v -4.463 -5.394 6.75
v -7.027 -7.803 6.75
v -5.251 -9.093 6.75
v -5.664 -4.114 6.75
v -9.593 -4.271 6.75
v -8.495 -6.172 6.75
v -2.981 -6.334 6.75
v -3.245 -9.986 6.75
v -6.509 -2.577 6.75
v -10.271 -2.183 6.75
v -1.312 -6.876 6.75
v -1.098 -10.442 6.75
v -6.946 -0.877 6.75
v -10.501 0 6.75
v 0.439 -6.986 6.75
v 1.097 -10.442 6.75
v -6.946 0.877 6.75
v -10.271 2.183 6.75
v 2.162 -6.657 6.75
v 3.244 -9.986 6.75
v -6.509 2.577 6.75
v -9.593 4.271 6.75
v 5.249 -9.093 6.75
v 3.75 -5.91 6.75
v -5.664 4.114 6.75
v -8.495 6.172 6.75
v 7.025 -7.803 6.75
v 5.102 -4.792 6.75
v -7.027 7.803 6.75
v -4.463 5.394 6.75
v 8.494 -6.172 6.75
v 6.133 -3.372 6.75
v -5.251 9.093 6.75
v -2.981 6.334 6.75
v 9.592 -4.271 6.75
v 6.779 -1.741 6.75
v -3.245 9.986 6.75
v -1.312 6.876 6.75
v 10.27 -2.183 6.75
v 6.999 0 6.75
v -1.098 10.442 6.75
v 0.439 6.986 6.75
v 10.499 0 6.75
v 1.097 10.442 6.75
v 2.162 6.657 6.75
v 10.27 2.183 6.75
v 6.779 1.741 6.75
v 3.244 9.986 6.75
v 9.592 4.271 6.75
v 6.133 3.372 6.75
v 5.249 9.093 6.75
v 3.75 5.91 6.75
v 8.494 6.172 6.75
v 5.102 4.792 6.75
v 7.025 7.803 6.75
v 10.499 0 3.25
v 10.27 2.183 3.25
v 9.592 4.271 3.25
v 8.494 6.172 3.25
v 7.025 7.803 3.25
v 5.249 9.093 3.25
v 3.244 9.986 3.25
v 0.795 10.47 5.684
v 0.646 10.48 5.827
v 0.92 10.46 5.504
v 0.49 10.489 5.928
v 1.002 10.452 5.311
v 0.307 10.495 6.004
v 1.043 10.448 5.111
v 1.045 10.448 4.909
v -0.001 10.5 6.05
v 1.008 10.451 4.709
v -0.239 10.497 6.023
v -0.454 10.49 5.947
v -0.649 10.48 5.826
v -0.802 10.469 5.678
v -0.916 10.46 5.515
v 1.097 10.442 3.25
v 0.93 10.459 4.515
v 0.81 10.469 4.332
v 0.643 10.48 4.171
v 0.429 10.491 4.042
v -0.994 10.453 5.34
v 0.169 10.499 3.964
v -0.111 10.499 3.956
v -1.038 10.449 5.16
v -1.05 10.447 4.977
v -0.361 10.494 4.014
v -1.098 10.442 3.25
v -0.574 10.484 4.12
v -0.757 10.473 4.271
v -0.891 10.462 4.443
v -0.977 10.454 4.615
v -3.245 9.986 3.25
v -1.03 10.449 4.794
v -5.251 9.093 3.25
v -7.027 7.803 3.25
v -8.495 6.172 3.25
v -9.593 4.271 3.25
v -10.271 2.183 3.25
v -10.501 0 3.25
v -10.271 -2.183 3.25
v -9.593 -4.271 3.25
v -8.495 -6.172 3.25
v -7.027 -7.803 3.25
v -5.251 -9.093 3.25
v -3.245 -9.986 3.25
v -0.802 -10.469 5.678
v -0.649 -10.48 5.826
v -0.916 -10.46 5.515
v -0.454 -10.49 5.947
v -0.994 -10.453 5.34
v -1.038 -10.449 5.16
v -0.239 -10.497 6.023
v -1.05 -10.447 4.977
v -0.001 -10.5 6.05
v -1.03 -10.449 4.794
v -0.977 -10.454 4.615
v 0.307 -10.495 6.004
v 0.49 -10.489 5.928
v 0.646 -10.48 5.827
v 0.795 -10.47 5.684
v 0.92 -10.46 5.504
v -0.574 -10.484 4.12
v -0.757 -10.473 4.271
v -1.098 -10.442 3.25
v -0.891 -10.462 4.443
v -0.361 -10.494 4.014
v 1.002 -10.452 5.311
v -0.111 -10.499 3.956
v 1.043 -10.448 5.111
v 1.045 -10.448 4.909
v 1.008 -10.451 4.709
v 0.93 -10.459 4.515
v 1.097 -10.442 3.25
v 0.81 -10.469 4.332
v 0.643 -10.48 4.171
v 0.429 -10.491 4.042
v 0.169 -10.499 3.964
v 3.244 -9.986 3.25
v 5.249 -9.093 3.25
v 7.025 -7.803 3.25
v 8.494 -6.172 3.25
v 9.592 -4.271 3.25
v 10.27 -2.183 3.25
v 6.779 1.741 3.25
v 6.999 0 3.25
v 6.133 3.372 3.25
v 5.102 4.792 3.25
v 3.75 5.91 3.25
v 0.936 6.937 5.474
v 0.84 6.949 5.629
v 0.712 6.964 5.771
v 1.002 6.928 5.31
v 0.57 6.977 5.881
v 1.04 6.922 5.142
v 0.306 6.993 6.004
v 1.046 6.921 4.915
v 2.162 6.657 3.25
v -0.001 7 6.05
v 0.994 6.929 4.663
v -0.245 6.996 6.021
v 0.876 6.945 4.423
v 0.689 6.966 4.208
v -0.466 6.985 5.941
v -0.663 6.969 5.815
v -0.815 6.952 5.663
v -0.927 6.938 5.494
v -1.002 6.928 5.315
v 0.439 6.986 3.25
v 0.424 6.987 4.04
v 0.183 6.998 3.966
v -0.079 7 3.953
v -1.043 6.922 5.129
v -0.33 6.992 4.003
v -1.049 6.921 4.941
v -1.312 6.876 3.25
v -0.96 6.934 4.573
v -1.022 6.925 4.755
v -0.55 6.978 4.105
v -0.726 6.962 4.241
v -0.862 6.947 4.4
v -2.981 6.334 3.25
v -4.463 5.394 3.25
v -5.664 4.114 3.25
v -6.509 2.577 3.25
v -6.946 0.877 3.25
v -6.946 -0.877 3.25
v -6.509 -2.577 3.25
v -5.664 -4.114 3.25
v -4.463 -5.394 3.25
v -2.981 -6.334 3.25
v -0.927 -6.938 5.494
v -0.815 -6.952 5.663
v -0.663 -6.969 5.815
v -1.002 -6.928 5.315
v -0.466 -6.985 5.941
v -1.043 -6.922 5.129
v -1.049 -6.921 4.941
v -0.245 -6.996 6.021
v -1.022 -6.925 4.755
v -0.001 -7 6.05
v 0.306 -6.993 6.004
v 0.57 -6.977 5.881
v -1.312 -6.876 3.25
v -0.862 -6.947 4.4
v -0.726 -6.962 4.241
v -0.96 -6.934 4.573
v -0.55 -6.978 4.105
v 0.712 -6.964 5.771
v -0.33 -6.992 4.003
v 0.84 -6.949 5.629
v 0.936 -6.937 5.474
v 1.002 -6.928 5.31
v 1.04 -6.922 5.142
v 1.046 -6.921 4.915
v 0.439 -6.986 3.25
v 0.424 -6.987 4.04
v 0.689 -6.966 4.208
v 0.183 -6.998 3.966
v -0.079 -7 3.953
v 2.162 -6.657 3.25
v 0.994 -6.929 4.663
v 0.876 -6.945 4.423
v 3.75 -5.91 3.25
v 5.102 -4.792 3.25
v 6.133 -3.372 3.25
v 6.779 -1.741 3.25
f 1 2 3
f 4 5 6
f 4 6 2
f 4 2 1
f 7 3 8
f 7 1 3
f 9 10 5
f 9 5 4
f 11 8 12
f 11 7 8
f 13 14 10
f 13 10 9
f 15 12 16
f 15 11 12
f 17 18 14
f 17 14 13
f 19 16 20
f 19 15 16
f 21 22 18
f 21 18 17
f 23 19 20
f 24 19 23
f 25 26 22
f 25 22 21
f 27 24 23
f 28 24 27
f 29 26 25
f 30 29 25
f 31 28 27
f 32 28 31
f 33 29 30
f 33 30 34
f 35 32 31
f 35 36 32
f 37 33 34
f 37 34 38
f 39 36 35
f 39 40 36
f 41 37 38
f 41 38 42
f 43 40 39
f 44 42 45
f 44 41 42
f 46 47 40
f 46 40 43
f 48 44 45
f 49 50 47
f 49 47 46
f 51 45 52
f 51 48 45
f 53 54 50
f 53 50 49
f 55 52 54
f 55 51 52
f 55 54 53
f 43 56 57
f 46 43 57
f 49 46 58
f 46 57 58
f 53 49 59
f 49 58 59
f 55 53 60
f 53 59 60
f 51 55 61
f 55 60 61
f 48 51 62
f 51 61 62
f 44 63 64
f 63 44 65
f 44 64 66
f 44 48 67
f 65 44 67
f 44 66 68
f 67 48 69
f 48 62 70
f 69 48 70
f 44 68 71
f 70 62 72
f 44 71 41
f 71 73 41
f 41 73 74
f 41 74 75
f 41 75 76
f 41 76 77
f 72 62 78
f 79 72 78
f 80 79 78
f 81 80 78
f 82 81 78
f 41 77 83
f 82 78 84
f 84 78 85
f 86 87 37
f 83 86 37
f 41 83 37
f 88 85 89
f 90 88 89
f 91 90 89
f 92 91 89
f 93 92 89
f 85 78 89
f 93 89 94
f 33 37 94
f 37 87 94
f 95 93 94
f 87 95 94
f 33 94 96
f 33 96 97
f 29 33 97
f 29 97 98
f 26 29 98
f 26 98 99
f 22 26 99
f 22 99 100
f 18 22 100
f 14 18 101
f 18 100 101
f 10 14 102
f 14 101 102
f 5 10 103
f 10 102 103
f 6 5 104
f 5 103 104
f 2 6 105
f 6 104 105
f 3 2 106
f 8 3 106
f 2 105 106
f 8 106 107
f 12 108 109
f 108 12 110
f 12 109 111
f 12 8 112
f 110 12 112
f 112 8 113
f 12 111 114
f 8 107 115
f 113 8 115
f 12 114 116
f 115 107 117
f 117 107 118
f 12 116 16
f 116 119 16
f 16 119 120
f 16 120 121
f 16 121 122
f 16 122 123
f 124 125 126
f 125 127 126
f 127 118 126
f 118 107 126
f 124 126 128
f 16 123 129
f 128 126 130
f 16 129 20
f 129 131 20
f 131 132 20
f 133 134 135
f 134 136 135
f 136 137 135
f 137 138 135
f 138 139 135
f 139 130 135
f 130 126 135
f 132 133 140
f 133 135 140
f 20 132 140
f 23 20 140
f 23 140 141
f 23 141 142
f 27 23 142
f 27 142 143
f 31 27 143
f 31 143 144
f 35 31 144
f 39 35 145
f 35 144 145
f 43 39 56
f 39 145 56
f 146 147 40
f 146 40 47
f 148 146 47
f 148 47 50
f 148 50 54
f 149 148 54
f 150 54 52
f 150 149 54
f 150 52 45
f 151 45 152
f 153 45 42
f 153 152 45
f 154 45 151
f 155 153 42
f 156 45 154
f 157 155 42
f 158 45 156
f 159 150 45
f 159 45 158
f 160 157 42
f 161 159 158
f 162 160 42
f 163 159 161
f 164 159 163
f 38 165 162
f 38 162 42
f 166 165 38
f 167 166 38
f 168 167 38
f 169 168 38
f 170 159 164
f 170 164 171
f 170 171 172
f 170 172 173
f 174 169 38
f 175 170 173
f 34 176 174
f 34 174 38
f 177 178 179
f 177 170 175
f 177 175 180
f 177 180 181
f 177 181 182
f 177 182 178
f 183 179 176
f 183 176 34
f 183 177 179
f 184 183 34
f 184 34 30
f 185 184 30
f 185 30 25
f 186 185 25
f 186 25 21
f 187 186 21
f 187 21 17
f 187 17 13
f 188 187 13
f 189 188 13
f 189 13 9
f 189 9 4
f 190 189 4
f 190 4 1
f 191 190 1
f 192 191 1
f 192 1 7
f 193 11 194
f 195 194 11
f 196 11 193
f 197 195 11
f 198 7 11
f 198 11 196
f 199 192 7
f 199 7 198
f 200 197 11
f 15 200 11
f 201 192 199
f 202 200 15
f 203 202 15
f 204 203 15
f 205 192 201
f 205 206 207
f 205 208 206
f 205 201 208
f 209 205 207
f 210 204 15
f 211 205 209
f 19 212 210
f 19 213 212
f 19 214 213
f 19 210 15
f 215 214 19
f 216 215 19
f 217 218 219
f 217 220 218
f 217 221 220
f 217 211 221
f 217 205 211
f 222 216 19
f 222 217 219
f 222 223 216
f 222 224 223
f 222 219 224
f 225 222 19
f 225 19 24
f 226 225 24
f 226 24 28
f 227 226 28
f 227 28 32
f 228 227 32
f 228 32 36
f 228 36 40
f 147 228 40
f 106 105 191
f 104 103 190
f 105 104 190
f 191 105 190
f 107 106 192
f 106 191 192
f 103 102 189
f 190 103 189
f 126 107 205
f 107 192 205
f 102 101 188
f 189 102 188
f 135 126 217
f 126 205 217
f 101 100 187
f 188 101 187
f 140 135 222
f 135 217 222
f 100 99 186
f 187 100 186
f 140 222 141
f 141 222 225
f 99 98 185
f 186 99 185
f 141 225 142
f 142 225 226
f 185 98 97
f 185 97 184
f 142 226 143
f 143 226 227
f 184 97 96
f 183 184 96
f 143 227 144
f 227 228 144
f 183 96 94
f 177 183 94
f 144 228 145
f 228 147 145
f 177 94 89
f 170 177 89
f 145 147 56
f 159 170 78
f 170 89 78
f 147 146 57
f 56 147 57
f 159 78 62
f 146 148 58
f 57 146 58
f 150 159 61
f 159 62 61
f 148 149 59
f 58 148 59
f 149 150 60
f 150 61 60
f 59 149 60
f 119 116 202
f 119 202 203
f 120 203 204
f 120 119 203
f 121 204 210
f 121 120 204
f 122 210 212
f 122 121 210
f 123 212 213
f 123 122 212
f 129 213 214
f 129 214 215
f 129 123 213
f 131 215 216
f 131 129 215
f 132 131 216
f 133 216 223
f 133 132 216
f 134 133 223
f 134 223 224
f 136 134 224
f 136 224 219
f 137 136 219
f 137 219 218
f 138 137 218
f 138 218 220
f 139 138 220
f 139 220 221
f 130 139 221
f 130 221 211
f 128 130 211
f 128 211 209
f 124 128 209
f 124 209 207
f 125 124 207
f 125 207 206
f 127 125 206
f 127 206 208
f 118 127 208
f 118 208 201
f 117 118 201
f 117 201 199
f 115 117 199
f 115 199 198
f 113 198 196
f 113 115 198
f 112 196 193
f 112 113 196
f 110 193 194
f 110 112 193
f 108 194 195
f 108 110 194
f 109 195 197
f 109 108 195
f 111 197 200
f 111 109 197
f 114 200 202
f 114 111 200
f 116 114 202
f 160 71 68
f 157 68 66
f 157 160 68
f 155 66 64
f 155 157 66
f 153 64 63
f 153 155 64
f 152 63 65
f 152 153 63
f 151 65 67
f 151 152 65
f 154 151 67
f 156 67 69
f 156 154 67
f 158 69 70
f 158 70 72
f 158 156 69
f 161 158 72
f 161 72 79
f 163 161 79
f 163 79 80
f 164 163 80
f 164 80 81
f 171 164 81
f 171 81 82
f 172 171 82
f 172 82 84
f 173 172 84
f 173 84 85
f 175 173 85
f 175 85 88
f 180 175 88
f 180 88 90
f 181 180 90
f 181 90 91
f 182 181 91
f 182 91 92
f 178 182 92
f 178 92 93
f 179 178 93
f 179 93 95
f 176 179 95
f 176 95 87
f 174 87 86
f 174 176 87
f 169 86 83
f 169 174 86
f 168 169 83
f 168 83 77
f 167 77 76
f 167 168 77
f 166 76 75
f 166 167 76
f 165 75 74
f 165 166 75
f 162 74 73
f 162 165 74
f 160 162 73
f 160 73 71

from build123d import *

# Parameters (mm, degrees)
SKETCH1_R               = 30
SKETCH1_R_2             = 20
BOSS_EXTRUDE1_DEPTH     = 10
CUT_EXTRUDE1_DEPTH      = 44.588989435
CUT_EXTRUDE1_DEPTH_BACK = 44.588989435
SKETCH2_R               = 3
SCALE1_SCALE            = 0.35


with BuildPart() as part:
    # Sketch1 → Boss-Extrude1 (new body)
    with BuildSketch(Plane.XY):
        Circle(SKETCH1_R)
        Circle(SKETCH1_R_2, mode=Mode.SUBTRACT)
    extrude(amount=BOSS_EXTRUDE1_DEPTH)

    # Sketch2 → Cut-Extrude1 (cut, two sides: drawn at the far end of the back side and taken through both)
    with BuildSketch(Plane(origin=(0, 0, 0), x_dir=(1, 0, 0), z_dir=(0, 1, 0)).offset(-CUT_EXTRUDE1_DEPTH_BACK)):
        with Locations(Location((0, -5, 0), (0, 0, 270))):
            Circle(SKETCH2_R)
    extrude(amount=CUT_EXTRUDE1_DEPTH + CUT_EXTRUDE1_DEPTH_BACK, mode=Mode.SUBTRACT)


with BuildPart() as part_1:
    # Scale1: scaled about (-0.001116422, 0, 4.999941886)
    add(part.part.scale(SCALE1_SCALE).moved(Location((-0.000725674, 0, 3.249962226))))


solid = part_1.part
